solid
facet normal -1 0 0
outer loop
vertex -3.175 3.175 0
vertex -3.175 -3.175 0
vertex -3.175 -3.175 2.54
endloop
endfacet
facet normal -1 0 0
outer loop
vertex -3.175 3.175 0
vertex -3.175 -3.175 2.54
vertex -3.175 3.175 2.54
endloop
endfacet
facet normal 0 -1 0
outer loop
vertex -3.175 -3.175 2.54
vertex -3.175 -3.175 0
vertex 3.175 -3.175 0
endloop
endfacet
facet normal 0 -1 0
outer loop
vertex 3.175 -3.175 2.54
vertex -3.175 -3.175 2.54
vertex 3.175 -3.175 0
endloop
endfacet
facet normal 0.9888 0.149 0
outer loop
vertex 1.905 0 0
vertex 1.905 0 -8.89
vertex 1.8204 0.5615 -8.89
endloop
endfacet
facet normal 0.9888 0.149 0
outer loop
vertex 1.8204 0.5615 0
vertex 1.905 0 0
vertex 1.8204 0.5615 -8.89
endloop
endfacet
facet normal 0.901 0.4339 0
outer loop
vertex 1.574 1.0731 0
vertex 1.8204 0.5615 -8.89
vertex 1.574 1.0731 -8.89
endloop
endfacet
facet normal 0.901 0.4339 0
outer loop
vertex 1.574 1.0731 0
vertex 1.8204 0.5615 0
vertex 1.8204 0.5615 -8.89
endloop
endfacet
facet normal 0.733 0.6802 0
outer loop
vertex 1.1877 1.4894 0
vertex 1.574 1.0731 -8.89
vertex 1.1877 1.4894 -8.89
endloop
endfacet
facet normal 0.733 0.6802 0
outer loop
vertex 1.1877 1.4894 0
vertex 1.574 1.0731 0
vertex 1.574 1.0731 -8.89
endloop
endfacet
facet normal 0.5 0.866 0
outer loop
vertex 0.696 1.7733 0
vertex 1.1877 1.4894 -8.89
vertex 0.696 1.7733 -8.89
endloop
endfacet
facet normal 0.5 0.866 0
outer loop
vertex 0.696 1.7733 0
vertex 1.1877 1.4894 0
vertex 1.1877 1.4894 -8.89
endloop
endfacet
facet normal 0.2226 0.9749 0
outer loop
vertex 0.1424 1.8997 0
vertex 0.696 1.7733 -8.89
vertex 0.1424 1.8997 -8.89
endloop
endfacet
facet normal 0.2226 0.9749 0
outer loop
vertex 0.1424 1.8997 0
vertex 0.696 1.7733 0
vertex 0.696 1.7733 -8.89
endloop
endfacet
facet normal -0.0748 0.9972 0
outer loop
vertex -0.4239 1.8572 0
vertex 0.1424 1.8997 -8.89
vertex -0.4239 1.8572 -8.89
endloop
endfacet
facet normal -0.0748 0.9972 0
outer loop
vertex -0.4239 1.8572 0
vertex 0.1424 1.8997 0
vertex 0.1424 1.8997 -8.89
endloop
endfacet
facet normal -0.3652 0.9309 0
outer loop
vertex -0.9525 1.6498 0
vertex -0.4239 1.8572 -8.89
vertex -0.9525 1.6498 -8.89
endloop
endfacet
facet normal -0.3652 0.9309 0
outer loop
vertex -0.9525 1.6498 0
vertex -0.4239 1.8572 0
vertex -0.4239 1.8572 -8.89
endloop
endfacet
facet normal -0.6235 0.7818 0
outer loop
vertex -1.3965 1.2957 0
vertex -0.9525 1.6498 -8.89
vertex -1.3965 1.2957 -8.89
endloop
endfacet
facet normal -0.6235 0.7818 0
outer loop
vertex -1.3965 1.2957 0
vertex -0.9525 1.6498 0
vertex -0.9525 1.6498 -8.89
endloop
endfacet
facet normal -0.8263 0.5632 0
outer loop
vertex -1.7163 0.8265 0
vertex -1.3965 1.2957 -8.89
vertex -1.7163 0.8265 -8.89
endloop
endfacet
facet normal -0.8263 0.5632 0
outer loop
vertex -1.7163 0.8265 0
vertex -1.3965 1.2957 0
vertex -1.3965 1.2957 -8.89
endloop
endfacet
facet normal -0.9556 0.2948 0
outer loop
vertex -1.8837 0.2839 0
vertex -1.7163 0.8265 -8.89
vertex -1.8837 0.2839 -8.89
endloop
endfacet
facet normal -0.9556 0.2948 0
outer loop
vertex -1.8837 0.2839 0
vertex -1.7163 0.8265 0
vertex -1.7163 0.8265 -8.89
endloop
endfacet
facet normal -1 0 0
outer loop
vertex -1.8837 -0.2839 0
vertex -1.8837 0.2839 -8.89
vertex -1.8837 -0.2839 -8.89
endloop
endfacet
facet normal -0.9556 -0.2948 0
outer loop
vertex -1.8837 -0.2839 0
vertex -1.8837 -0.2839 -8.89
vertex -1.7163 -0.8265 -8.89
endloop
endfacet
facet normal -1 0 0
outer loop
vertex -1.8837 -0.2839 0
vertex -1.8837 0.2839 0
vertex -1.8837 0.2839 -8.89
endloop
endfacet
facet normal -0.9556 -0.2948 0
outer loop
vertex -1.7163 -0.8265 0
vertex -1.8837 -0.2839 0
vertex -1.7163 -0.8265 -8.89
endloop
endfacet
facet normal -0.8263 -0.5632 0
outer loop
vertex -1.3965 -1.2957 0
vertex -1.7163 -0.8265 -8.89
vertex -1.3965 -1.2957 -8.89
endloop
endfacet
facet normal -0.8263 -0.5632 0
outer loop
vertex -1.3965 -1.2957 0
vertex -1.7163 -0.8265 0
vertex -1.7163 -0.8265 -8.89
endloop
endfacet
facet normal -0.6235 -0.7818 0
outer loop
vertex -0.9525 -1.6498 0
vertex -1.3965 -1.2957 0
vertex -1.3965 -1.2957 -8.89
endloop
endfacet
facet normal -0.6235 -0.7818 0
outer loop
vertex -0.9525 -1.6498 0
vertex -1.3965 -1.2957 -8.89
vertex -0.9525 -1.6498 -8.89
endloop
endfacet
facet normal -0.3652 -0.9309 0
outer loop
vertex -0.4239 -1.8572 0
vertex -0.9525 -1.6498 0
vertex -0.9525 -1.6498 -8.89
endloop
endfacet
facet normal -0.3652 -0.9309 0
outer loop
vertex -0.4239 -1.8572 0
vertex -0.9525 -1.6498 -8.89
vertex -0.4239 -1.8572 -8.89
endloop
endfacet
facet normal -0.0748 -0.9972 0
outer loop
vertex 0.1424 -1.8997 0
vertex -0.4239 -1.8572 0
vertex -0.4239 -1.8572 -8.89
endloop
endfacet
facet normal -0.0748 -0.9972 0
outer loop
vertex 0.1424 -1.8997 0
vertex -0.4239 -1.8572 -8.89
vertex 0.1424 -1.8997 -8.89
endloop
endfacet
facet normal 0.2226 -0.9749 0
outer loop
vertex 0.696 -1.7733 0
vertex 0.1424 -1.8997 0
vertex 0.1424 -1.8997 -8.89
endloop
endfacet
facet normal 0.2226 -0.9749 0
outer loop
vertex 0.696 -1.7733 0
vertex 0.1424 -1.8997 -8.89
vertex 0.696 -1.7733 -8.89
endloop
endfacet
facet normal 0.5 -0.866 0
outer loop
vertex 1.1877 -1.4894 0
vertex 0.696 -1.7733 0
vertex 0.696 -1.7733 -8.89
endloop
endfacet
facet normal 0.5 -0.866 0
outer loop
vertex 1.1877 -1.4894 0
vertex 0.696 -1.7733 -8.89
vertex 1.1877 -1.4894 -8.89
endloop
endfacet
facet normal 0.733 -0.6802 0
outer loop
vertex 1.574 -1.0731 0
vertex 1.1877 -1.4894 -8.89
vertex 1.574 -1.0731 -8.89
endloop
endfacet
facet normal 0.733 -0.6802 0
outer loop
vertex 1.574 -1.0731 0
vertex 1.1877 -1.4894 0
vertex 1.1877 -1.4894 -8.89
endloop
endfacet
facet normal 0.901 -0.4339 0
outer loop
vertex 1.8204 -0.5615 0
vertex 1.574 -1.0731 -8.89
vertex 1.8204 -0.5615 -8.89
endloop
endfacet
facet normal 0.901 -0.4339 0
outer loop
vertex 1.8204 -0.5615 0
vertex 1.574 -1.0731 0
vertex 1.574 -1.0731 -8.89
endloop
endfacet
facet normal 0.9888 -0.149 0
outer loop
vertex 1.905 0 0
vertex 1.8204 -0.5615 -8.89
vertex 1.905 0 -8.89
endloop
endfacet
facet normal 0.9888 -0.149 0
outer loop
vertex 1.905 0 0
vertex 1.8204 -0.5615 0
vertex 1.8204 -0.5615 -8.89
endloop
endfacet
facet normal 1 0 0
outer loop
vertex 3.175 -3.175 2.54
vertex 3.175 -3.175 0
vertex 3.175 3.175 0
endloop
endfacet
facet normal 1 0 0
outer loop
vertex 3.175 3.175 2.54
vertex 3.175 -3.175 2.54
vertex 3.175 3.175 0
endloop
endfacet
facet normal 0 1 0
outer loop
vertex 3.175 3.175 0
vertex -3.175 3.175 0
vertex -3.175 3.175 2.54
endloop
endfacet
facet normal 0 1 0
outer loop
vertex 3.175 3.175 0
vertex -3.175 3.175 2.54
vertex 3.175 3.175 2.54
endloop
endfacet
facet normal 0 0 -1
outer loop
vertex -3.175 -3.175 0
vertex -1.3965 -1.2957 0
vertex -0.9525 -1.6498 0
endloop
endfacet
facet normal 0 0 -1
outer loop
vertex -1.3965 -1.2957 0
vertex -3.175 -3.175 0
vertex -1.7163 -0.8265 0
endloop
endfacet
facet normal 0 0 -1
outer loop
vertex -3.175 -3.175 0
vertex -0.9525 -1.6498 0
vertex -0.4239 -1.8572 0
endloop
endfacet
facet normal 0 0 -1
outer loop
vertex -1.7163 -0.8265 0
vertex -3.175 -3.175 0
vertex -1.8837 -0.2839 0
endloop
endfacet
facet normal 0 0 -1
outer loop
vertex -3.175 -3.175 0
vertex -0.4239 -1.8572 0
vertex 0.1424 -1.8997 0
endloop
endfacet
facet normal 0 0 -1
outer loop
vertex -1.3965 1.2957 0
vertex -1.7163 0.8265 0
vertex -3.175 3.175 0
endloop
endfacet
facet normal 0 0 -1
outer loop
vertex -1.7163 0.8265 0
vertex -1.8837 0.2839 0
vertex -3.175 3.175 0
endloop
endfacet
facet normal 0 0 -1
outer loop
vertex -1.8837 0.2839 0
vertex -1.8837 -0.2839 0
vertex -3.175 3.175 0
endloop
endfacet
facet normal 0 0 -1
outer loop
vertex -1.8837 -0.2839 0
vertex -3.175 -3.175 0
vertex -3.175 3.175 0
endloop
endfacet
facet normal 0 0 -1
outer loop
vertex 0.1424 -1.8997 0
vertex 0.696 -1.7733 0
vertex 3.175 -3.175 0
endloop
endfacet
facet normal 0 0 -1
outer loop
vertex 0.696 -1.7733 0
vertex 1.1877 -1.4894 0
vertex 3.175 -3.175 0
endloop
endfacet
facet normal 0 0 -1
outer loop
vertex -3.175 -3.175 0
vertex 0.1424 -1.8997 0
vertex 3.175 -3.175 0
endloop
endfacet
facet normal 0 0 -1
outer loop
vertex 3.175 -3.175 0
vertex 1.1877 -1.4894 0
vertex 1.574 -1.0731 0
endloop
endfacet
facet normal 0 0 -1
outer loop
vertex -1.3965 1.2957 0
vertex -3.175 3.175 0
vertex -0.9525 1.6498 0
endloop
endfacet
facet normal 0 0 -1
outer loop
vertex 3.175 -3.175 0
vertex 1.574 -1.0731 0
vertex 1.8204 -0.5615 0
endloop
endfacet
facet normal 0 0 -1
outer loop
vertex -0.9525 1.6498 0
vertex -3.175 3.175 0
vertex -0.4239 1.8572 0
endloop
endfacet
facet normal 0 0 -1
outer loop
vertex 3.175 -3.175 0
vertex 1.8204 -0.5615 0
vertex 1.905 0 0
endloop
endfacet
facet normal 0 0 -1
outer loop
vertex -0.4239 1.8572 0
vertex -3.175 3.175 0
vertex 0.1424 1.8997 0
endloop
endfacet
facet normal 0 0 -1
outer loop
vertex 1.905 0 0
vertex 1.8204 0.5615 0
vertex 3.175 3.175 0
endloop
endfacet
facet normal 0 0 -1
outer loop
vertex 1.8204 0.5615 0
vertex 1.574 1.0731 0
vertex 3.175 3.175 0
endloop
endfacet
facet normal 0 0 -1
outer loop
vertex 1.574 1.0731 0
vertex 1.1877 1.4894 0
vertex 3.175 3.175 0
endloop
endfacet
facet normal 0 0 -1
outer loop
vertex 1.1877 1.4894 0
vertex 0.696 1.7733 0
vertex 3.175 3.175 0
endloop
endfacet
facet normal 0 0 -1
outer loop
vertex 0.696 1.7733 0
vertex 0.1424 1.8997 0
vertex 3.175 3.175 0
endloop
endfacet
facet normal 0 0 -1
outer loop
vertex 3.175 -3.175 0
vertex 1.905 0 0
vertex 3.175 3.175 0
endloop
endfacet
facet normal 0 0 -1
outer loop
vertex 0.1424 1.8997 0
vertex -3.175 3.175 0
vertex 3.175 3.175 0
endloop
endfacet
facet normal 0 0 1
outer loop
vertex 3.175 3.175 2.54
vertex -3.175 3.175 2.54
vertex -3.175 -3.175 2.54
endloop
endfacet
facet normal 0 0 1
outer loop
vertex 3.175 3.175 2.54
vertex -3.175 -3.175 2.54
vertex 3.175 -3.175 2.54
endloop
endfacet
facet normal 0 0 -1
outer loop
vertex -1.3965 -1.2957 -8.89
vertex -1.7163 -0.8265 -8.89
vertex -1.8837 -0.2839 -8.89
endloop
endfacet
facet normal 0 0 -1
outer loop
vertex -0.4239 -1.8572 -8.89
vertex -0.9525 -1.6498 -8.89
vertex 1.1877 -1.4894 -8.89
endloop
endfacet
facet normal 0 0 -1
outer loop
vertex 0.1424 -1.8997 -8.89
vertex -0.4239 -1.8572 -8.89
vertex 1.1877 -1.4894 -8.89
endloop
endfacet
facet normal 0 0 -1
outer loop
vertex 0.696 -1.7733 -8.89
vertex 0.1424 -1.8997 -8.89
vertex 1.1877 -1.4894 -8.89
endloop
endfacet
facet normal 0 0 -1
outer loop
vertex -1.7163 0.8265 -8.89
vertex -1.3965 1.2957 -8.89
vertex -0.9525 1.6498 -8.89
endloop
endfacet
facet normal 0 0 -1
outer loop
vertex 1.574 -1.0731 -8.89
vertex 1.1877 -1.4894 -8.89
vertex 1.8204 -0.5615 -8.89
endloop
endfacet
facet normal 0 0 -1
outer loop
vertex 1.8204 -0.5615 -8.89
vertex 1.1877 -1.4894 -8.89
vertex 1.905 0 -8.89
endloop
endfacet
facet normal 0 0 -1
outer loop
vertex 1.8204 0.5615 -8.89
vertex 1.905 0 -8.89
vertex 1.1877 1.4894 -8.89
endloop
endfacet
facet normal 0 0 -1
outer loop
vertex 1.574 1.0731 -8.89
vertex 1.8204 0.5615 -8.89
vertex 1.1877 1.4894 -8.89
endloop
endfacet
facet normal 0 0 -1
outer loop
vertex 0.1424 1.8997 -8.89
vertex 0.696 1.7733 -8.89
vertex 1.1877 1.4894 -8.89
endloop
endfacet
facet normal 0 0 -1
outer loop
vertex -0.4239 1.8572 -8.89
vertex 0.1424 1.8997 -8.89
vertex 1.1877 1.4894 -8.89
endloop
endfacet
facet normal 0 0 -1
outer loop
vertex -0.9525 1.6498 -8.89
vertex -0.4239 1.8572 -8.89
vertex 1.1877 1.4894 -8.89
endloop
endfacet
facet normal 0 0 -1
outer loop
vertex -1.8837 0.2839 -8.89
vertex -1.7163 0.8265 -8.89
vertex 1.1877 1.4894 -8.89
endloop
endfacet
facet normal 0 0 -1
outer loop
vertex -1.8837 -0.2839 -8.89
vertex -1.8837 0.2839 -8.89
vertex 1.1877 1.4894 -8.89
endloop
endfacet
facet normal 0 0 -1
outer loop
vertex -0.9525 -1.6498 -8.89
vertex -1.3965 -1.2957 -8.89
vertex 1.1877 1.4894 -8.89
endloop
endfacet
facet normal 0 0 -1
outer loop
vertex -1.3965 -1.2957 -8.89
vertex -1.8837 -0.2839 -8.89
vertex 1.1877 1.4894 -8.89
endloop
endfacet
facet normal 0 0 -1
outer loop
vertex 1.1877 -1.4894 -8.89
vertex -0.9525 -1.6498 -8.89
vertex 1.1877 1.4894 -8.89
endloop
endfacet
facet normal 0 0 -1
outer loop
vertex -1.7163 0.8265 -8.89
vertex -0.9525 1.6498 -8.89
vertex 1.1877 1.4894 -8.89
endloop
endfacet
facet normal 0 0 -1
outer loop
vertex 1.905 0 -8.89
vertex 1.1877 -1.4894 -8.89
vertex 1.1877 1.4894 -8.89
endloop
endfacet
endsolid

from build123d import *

# Parameters (mm, degrees)
SKETCH1_R           = 1.905
BOSS_EXTRUDE1_DEPTH = 8.89
SKETCH2_W           = 6.35
SKETCH2_H           = 6.35
BOSS_EXTRUDE2_DEPTH = 2.54


with BuildPart() as part:
    # Sketch1 → Boss-Extrude1 (new body)
    with BuildSketch(Plane.XY):
        Circle(SKETCH1_R)
    extrude(amount=-BOSS_EXTRUDE1_DEPTH)

    # Sketch2 → Boss-Extrude2 (add)
    with BuildSketch(Plane.XY):
        Rectangle(SKETCH2_W, SKETCH2_H)
    extrude(amount=BOSS_EXTRUDE2_DEPTH)


solid = part.part
